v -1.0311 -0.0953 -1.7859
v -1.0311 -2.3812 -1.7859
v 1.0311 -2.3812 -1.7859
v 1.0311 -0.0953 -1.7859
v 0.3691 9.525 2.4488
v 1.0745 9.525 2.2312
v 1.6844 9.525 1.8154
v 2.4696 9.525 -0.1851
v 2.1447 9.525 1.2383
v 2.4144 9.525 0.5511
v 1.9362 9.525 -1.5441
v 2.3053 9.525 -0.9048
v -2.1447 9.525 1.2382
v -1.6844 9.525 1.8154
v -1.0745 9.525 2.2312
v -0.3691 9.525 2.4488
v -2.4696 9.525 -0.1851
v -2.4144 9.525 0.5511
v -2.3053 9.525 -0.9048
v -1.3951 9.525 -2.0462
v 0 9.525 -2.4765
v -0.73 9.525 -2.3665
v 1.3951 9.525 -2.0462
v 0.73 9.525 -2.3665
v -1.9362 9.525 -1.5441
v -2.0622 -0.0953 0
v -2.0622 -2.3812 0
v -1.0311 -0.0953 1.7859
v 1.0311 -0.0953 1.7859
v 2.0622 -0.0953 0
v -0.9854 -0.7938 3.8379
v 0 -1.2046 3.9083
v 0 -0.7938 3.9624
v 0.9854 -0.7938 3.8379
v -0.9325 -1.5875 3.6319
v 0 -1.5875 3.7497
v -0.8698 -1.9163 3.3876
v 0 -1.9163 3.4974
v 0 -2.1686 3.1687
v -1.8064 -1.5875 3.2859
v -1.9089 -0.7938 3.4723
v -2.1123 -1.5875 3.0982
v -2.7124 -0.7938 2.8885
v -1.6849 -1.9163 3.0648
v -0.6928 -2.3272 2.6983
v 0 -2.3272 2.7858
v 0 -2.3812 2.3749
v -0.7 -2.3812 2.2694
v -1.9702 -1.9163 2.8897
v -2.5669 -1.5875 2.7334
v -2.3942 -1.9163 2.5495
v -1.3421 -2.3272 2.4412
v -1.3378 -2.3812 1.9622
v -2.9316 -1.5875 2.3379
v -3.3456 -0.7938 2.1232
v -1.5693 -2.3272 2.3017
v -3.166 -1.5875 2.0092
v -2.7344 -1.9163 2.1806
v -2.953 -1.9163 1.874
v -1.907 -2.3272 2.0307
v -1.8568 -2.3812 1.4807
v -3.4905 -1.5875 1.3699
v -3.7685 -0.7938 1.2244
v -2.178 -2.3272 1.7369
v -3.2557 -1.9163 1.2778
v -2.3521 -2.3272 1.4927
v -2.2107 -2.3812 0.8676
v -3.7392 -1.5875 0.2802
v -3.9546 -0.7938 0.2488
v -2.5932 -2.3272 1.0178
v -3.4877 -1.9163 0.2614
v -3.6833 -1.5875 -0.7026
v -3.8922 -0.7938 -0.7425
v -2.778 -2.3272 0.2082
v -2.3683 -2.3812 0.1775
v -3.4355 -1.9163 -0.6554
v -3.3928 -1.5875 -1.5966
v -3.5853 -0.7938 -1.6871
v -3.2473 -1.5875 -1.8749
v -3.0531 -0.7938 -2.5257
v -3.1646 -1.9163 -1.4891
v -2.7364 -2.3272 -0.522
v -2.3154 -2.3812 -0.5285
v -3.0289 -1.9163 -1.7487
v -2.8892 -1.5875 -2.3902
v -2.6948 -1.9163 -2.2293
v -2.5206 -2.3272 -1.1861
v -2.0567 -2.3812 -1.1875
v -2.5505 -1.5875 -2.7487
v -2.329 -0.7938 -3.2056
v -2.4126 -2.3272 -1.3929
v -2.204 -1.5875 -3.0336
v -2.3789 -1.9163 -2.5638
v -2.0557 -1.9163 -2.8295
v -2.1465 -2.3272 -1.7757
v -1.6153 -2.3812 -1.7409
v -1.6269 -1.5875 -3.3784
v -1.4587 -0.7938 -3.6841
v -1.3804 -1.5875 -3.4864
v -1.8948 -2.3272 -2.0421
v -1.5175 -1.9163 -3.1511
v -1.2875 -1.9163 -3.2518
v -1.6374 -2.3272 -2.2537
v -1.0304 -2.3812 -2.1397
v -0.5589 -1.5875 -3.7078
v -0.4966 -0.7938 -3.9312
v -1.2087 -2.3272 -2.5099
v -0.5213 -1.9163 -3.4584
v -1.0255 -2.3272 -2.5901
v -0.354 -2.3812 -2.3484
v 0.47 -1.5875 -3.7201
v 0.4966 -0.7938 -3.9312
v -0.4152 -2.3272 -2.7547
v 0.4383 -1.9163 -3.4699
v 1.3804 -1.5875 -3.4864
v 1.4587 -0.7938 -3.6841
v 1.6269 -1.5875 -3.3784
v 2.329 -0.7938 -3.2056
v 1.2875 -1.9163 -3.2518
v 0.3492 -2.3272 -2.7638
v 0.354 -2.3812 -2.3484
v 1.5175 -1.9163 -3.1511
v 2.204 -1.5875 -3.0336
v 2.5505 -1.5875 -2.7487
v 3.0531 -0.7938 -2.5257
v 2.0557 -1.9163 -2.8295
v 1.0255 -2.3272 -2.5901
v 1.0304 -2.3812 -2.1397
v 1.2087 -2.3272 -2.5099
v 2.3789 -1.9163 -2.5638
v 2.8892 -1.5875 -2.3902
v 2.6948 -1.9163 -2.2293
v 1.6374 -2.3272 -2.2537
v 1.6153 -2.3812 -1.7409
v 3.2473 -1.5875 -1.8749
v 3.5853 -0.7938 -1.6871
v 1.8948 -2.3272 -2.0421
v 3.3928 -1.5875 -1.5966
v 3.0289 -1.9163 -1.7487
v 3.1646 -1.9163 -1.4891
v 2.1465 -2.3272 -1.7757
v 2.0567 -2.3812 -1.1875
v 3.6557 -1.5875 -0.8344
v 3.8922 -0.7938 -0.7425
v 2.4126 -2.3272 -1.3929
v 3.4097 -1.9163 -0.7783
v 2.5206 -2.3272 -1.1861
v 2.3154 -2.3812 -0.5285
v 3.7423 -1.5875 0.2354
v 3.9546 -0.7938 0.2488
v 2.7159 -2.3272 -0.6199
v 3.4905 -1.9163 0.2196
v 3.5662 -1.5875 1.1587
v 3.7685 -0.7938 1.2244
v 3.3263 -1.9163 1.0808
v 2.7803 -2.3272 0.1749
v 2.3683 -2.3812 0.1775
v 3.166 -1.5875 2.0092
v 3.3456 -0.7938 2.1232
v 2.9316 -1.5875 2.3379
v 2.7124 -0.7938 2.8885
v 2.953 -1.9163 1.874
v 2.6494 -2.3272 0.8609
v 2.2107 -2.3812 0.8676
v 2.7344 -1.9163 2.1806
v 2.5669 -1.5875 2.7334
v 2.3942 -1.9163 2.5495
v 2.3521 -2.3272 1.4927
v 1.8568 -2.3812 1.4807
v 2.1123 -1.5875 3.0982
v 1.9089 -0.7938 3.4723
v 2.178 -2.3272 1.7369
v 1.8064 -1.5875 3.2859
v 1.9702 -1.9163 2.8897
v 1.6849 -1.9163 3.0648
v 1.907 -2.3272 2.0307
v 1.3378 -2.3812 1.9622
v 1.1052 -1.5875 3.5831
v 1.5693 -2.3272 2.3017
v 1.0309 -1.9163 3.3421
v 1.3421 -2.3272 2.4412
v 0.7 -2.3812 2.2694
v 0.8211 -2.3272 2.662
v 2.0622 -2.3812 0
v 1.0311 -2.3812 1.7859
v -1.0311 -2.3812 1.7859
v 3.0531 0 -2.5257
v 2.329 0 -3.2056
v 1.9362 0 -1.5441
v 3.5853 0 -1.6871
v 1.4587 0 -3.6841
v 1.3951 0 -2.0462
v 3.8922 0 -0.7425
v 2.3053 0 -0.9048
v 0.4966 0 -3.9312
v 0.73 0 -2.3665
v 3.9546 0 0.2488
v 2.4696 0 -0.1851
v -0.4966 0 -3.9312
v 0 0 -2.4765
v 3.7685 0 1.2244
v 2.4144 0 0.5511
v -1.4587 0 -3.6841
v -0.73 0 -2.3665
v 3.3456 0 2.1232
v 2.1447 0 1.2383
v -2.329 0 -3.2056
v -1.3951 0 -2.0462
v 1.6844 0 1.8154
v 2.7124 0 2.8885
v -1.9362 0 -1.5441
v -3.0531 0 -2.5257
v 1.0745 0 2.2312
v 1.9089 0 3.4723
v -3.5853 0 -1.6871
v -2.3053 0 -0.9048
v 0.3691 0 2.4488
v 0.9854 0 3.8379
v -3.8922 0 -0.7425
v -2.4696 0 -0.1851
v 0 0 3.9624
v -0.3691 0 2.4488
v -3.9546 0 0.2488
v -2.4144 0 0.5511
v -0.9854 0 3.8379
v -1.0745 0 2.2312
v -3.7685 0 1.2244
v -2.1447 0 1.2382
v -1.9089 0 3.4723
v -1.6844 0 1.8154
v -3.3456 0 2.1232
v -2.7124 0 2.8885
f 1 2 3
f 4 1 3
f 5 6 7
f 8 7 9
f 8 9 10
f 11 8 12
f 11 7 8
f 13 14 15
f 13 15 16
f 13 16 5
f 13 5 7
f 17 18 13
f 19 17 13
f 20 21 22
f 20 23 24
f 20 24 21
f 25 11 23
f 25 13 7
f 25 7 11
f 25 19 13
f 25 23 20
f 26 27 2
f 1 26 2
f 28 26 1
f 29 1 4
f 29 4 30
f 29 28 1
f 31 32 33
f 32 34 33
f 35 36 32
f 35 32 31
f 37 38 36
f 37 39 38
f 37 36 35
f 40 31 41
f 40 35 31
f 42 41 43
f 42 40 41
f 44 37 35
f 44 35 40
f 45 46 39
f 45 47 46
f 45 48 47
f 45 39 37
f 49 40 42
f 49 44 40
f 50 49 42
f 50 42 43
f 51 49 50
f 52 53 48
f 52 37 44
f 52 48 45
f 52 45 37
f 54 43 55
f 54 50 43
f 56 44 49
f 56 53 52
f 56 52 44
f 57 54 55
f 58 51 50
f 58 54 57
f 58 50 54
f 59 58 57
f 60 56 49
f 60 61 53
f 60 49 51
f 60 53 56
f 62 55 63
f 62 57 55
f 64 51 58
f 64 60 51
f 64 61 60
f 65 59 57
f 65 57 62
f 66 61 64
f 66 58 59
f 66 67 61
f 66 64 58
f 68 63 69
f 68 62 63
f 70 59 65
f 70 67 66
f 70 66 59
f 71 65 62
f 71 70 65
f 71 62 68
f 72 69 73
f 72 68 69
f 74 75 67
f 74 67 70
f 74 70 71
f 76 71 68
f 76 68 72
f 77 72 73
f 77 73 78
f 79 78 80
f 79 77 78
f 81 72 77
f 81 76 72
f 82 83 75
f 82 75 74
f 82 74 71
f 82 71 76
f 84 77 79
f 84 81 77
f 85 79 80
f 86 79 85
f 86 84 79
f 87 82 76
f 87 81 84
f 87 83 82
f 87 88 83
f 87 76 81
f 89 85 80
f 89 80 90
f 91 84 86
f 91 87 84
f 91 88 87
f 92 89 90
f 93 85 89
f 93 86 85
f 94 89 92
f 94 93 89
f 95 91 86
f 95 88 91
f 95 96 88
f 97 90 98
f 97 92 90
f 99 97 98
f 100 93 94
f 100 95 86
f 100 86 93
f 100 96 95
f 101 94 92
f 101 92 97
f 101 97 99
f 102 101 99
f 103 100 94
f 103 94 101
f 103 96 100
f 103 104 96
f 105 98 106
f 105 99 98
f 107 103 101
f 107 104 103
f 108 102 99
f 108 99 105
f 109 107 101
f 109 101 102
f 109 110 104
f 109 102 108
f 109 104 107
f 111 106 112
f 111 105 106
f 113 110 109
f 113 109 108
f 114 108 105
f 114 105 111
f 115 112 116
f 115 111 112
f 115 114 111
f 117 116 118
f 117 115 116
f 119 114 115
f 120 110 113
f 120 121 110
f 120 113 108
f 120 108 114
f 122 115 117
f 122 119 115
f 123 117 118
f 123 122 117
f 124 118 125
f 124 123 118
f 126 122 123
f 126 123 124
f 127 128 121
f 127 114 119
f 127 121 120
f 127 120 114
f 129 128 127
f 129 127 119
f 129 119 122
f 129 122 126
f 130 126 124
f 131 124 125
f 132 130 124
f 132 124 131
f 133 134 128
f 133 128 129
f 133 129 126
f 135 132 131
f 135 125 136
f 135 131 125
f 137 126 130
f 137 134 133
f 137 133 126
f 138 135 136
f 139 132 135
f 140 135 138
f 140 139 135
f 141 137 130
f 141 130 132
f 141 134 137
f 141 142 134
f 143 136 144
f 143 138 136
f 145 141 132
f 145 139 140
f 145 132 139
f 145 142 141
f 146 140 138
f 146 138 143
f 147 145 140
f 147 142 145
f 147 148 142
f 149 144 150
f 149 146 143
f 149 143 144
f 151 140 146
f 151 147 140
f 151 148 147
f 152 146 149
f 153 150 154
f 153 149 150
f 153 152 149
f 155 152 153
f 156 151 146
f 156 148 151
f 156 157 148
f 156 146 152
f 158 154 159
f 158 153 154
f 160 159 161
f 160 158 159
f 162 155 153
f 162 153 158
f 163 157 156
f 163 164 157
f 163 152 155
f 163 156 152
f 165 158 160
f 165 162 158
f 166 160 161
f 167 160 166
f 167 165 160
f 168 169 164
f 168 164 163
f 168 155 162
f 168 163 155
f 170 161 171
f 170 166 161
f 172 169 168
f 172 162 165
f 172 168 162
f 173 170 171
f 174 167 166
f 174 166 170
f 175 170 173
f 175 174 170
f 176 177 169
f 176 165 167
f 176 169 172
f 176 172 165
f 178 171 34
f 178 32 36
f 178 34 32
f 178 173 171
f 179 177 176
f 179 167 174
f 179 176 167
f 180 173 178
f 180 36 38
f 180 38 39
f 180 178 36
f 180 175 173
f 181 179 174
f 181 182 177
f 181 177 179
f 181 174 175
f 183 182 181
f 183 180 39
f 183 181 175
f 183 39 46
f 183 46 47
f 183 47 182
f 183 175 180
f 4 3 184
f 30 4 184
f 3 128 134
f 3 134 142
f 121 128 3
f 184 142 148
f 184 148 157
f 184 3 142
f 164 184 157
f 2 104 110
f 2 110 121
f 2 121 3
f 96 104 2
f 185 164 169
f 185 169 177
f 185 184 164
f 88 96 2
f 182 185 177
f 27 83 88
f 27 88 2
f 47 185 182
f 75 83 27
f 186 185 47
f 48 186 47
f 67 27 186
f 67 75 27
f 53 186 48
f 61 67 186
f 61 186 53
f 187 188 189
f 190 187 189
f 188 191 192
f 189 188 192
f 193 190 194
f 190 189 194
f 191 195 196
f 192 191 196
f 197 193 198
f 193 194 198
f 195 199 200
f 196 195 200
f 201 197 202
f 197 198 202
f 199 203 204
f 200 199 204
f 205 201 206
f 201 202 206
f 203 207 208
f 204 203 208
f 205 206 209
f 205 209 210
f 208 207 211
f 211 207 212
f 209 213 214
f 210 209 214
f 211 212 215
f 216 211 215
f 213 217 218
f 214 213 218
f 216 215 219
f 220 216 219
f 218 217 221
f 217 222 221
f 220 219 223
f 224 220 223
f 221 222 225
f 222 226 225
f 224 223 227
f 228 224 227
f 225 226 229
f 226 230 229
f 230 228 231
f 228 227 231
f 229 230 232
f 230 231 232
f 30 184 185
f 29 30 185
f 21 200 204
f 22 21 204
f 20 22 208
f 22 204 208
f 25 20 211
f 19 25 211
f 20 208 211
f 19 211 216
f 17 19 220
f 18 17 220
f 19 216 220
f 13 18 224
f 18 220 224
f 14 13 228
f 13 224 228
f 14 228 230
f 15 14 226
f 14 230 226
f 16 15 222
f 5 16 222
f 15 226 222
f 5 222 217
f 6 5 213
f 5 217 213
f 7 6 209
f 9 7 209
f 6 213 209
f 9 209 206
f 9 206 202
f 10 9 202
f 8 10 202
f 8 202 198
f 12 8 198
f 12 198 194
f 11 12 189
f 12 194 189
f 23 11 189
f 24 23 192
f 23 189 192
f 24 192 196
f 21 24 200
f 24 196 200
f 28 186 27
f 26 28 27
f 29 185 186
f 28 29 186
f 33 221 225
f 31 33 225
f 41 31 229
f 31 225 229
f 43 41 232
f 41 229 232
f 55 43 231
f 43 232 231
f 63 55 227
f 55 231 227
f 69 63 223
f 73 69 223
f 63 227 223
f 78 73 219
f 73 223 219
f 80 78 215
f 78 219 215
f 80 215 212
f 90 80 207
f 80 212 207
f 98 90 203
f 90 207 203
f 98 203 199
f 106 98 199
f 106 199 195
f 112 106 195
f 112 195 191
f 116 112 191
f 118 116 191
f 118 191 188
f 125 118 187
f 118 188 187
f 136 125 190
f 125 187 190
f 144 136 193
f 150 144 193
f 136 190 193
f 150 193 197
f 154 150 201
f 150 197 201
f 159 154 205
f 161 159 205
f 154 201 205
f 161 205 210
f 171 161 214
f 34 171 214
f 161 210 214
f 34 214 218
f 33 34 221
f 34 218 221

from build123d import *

# Parameters (mm, degrees)
SKETCH1_R           = 2.4765
BOSS_EXTRUDE1_DEPTH = 9.525
SKETCH2_R           = 3.9624
BOSS_EXTRUDE2_DEPTH = 2.38125
CUT_EXTRUDE1_DEPTH  = 2.286
FILLET1_R           = 1.5875


with BuildPart() as part:
    # Sketch1 → Boss-Extrude1 (new body)
    with BuildSketch(Plane(origin=(0, 0, 0), x_dir=(1, 0, 0), z_dir=(0, 1, 0))):
        with Locations(Location((0, 0, 0), (0, 0, 90))):
            Circle(SKETCH1_R)
    extrude(amount=BOSS_EXTRUDE1_DEPTH)

    # Sketch2 → Boss-Extrude2 (add)
    with BuildSketch(Plane.XZ):
        with Locations(Location((0, 0, 0), (0, 0, 90))):
            Circle(SKETCH2_R)
    extrude(amount=BOSS_EXTRUDE2_DEPTH)

    # Sketch3 → Cut-Extrude1 (cut)
    with BuildSketch(Plane.XZ.offset(2.38125)):
        Polygon((2.062222993, 0), (1.031111496, 1.7859375), (-1.031111496, 1.7859375), (-2.062222993, 0), (-1.031111496, -1.7859375), (1.031111496, -1.7859375), align=None)
    extrude(amount=-CUT_EXTRUDE1_DEPTH, mode=Mode.SUBTRACT)

    # Fillet1
    fillet1_edges = [part.edges().sort_by_distance(p)[0] for p in [
        (0, -2.38125, -3.9624),
    ]]
    fillet(fillet1_edges, radius=FILLET1_R)


solid = part.part
